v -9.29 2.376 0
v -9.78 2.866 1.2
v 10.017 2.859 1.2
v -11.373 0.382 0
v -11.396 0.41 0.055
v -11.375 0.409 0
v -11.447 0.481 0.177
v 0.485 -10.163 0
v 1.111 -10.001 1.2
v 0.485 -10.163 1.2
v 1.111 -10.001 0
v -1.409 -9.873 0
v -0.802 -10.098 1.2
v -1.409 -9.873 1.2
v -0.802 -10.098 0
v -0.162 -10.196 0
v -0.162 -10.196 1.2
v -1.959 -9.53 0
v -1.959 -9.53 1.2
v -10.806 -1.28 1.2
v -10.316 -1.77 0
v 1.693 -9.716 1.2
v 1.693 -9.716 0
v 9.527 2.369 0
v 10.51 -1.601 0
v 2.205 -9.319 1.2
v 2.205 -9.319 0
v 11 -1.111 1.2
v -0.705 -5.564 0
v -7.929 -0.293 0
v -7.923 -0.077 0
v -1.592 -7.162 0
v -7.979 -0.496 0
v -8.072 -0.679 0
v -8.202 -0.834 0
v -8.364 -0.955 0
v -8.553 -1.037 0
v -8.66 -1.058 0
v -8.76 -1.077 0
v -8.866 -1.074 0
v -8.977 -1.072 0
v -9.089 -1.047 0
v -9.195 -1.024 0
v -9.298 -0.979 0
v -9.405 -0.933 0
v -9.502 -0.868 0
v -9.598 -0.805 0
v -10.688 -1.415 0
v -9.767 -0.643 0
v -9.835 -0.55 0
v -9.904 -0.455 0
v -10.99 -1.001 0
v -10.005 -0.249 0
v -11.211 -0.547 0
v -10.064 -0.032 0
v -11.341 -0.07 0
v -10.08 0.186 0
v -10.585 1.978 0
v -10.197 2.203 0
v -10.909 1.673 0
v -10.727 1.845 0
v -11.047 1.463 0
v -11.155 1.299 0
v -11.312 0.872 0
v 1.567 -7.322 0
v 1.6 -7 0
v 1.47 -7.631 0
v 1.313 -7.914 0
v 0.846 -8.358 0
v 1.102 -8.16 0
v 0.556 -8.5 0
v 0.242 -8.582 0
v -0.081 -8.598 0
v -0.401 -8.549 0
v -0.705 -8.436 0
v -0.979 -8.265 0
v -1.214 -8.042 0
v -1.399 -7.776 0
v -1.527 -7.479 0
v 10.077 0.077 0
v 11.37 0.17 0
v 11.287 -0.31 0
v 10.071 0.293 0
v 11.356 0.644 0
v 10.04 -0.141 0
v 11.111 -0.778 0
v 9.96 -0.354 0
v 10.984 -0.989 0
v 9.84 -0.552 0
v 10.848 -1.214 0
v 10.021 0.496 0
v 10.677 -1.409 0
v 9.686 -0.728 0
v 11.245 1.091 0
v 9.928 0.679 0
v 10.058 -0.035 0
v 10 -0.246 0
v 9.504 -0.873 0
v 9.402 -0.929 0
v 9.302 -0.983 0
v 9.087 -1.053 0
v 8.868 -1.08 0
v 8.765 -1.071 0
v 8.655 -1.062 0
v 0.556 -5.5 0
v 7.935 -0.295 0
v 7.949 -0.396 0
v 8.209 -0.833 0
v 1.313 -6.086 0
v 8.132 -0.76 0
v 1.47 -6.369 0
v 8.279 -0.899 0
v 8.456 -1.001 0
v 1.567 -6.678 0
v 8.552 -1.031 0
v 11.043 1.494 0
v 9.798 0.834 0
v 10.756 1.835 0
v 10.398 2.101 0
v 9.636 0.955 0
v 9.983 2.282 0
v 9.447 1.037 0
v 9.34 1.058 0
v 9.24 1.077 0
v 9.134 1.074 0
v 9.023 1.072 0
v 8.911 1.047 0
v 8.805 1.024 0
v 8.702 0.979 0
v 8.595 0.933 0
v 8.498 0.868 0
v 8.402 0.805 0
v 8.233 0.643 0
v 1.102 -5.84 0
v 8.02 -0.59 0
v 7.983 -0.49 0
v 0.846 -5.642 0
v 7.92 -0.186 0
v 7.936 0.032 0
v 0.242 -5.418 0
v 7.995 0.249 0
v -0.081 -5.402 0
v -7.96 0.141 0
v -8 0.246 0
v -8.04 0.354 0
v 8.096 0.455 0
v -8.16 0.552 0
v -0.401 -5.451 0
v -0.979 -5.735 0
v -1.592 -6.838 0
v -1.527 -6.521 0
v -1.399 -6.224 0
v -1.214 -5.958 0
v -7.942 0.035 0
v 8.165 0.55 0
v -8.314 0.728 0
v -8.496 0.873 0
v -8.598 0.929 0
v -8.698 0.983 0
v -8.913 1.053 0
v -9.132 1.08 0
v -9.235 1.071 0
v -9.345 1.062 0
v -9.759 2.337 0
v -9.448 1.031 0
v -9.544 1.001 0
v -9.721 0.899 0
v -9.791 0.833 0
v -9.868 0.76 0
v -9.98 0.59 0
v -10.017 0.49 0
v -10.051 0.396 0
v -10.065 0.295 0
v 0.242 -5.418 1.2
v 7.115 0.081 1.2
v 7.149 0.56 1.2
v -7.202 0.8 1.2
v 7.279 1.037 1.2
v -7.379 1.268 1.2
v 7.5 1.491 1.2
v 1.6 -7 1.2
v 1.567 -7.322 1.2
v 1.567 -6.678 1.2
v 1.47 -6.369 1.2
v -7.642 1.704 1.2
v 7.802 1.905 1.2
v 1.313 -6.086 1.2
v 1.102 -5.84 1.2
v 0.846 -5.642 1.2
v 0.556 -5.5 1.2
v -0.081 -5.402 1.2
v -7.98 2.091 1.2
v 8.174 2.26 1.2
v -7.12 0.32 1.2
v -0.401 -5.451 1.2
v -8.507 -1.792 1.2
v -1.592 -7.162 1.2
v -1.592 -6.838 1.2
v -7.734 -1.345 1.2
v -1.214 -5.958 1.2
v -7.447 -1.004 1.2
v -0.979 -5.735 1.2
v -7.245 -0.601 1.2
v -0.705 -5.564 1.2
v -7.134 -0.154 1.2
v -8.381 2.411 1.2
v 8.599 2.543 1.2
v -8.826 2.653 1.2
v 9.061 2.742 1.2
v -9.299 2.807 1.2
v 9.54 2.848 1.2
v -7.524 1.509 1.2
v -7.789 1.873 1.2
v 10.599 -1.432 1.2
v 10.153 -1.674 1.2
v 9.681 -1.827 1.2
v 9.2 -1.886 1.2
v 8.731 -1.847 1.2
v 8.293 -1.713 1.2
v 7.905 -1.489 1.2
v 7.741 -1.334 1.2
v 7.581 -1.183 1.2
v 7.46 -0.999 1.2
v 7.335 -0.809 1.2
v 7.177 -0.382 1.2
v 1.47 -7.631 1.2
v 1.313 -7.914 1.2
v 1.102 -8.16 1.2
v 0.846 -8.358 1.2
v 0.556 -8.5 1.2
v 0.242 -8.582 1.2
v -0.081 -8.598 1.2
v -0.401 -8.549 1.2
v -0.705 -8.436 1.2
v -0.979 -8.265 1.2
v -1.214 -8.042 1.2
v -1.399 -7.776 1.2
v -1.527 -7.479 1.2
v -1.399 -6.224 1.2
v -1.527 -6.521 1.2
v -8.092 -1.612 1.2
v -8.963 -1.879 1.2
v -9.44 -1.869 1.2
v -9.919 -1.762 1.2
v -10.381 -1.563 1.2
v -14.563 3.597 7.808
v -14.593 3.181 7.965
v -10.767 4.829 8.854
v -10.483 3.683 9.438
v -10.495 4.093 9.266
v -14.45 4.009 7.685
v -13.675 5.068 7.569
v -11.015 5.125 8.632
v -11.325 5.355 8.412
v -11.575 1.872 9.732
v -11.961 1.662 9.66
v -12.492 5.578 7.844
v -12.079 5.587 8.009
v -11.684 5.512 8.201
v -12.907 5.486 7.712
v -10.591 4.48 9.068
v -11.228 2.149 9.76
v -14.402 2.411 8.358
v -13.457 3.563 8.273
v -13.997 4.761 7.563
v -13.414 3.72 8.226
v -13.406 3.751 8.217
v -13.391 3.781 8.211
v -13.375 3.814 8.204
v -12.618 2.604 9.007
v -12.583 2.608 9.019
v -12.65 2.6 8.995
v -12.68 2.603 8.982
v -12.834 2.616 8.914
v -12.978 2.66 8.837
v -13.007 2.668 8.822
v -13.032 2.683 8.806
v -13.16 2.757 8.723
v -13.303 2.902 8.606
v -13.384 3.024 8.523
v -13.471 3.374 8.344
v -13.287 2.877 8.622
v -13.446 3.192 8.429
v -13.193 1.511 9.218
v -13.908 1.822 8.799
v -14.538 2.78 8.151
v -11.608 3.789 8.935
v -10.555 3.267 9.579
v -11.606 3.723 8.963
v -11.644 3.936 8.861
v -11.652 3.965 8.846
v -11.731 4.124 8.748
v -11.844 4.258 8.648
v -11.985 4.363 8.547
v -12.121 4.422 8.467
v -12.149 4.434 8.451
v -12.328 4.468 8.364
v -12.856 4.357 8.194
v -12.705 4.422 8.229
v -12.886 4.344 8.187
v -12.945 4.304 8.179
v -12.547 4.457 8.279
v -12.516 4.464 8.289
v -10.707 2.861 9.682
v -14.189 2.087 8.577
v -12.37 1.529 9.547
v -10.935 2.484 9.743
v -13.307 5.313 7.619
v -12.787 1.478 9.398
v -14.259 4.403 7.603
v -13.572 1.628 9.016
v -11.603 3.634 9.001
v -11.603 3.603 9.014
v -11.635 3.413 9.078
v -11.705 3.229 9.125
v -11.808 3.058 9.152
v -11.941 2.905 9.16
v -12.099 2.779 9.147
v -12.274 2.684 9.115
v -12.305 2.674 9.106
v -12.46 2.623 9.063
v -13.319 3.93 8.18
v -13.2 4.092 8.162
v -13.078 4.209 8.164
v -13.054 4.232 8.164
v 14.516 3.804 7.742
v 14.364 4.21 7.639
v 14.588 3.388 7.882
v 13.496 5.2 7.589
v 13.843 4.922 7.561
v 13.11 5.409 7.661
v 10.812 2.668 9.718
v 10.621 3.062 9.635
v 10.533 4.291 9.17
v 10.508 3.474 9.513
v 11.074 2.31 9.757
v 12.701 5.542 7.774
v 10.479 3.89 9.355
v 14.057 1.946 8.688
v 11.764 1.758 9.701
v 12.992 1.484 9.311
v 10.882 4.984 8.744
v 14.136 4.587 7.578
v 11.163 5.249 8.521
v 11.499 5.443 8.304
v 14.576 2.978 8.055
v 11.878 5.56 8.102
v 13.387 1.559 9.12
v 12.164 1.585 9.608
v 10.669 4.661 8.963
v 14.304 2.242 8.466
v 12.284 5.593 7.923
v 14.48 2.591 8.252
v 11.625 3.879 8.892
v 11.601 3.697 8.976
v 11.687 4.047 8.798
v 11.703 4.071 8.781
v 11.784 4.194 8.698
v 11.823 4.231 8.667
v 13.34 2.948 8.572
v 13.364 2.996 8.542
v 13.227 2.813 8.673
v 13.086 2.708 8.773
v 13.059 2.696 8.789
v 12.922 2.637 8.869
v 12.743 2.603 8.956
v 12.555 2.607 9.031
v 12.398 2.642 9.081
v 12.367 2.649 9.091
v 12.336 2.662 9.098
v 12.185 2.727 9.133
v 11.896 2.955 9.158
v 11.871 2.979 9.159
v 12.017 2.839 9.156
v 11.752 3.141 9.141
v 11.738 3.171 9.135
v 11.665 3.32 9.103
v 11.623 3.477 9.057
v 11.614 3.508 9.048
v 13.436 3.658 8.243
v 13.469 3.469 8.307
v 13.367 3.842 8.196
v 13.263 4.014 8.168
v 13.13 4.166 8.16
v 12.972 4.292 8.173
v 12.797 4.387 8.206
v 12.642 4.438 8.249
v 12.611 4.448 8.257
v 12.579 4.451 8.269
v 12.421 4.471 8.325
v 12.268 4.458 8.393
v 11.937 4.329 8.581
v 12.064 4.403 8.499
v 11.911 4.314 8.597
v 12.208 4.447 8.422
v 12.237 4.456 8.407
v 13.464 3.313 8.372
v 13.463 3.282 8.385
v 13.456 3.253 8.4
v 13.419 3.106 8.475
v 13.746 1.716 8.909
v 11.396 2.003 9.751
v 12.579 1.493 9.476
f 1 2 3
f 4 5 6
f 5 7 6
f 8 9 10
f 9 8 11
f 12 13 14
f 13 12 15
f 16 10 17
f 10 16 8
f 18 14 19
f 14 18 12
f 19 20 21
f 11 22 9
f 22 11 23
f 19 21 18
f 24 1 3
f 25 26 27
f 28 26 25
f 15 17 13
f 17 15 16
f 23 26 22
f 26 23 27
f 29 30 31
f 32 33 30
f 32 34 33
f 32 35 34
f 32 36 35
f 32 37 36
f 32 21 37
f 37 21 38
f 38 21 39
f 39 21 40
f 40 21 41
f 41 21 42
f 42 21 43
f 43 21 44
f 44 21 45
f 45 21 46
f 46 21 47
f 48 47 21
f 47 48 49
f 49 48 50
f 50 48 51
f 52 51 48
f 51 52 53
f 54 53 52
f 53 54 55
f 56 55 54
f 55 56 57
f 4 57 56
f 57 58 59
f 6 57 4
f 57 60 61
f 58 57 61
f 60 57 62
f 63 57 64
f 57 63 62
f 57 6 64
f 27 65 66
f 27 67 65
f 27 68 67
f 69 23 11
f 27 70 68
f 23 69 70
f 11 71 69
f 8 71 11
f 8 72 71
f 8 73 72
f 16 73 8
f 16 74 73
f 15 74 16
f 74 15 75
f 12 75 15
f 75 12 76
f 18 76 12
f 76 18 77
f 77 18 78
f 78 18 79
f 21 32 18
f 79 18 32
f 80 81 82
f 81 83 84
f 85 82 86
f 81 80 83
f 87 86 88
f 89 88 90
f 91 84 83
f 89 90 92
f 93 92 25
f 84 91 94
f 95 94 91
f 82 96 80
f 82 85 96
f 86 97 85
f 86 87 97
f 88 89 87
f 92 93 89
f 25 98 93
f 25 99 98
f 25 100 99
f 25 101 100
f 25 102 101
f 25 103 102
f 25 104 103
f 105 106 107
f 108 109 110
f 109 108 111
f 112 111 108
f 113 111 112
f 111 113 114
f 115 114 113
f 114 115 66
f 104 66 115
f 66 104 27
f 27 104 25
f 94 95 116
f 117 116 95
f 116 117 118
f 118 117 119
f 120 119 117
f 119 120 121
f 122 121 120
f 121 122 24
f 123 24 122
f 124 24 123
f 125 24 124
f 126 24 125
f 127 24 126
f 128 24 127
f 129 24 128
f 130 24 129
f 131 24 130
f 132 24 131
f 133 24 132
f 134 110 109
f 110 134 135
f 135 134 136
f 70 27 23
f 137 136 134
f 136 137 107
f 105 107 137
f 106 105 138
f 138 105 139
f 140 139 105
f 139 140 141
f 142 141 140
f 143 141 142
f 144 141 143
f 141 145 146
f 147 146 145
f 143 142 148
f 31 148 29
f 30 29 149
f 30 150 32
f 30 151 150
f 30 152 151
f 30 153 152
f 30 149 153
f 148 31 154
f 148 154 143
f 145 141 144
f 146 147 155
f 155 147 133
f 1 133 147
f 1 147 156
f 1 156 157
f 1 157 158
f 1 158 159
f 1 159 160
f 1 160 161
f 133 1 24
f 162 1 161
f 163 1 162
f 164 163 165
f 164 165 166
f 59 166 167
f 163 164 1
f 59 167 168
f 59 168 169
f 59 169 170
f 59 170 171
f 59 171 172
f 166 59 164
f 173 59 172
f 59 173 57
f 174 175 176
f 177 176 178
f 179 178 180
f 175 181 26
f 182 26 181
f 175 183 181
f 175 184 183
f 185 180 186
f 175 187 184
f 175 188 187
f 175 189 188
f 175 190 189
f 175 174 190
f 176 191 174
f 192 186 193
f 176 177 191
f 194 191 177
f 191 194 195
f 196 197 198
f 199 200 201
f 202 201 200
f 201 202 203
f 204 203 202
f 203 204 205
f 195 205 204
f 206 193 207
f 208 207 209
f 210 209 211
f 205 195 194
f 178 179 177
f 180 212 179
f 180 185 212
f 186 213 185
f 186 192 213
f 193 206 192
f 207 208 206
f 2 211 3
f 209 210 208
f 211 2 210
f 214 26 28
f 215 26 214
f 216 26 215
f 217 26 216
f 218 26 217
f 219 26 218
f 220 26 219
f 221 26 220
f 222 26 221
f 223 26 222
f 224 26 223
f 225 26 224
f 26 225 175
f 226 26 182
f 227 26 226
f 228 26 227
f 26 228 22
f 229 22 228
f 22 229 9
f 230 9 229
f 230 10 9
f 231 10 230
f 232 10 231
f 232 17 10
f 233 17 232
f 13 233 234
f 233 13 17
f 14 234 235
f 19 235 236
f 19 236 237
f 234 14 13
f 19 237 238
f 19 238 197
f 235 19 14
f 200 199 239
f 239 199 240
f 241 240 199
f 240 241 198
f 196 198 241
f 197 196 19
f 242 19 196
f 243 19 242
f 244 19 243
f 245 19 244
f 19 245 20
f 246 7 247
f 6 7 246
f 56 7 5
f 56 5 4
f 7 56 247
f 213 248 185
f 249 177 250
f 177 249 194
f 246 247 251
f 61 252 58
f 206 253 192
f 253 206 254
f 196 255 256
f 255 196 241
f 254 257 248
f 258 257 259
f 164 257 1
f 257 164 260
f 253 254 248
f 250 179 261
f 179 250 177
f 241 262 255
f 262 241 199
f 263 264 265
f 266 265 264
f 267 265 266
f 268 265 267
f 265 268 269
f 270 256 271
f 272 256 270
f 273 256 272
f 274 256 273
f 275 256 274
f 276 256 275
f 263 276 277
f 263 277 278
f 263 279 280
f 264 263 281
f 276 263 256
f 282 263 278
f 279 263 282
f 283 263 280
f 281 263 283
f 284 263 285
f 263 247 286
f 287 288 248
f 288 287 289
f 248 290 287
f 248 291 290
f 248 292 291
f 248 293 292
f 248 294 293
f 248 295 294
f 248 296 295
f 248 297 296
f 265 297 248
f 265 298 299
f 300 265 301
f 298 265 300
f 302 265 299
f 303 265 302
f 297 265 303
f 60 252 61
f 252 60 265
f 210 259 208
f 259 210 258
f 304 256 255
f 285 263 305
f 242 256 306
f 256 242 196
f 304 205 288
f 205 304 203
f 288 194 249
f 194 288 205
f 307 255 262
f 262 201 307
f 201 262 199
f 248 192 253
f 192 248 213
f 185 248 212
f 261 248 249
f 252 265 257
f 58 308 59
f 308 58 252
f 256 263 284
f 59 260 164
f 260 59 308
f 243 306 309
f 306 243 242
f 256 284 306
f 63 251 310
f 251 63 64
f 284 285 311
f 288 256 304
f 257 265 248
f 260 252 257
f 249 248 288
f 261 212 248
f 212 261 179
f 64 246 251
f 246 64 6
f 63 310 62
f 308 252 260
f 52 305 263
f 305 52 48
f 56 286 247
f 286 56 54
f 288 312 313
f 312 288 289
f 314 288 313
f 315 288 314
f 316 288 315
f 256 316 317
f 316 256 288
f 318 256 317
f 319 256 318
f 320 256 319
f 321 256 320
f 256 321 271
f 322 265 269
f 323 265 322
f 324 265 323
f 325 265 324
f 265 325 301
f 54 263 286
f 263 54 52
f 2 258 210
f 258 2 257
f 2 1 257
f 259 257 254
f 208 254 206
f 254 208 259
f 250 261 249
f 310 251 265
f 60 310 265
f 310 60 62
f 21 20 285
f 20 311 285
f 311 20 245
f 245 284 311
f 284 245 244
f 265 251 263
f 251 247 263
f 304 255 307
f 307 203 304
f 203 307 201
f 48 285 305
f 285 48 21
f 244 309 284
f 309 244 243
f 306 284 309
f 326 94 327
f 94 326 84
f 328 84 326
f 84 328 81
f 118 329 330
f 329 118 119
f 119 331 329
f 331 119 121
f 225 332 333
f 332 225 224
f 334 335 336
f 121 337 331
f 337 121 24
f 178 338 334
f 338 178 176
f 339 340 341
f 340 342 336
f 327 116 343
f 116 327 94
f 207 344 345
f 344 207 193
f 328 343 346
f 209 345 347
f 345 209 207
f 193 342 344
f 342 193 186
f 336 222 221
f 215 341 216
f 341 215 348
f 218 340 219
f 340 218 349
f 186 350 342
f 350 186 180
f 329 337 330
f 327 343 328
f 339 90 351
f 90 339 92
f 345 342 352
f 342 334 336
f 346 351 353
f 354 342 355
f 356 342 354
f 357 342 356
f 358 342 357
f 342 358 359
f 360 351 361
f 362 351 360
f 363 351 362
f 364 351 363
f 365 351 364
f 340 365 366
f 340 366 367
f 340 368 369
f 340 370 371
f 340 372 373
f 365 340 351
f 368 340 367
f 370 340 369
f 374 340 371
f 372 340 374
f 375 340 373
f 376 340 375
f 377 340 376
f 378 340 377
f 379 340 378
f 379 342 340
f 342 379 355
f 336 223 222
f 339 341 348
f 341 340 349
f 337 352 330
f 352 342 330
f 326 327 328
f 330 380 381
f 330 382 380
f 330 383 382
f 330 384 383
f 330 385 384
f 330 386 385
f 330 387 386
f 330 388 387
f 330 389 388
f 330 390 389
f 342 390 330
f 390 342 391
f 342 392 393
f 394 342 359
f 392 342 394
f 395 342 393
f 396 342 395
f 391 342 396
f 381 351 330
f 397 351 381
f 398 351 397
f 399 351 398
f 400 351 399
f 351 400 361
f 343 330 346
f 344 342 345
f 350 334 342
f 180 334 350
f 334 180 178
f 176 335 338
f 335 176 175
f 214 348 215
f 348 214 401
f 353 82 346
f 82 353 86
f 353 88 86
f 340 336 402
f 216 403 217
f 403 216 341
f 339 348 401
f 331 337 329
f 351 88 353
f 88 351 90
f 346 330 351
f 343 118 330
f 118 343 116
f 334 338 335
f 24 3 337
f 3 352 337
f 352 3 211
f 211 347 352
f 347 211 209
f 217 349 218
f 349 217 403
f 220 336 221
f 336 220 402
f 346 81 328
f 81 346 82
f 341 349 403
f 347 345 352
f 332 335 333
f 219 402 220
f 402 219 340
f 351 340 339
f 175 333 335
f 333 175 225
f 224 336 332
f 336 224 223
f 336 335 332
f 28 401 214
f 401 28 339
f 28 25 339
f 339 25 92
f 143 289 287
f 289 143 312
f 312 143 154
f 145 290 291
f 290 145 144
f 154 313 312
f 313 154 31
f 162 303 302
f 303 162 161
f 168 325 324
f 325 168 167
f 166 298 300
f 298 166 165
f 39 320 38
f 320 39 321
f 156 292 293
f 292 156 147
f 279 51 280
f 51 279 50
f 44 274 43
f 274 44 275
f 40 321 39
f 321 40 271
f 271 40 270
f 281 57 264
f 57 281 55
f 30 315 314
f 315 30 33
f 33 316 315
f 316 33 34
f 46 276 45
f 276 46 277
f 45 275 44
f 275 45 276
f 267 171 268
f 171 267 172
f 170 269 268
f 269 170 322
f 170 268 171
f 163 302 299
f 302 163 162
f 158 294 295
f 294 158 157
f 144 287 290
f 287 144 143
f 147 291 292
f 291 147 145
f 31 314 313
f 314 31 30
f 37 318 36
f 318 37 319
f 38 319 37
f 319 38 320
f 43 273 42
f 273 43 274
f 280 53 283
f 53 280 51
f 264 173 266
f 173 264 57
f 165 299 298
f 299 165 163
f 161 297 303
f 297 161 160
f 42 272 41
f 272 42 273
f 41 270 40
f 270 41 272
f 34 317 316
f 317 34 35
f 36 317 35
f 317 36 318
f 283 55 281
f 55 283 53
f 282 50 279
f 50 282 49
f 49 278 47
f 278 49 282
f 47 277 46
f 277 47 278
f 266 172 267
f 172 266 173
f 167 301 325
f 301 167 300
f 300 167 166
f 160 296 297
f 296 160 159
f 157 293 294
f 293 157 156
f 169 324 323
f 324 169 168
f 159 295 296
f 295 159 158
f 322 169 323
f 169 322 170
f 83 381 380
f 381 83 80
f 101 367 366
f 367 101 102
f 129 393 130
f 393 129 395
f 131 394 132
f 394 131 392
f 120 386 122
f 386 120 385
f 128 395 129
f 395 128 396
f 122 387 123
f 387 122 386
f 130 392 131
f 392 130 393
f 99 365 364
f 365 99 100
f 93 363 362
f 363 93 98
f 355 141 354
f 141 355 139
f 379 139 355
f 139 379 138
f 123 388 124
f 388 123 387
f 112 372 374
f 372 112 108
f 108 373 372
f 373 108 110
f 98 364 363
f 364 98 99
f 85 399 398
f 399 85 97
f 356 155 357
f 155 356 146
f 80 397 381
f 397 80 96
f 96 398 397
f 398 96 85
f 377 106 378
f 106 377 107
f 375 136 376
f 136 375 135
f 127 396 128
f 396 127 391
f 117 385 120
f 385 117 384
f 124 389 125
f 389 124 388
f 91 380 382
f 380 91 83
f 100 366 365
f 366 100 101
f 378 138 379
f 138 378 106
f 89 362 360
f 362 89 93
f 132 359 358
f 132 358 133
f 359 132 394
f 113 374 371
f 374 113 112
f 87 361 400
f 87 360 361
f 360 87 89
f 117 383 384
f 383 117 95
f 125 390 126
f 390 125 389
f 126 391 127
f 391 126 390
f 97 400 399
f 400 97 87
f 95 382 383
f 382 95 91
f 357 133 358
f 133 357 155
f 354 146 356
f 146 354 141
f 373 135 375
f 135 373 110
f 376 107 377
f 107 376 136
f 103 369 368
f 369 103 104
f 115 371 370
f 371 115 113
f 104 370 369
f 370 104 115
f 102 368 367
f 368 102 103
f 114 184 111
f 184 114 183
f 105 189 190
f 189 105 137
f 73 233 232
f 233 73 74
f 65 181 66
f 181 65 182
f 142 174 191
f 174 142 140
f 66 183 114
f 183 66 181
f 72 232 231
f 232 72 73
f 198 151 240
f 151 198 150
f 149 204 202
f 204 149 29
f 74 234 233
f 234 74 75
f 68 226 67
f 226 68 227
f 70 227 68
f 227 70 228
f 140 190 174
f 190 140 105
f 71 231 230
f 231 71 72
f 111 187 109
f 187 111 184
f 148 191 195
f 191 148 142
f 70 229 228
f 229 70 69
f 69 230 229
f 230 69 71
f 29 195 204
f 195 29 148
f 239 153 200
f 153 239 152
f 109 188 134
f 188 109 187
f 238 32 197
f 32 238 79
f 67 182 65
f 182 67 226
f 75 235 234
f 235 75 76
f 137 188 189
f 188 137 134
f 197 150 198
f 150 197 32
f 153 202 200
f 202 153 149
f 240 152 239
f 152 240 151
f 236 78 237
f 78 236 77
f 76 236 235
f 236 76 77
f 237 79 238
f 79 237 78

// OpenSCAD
d1=2;
th_d=1.2;
$fn=31;

module tube_i(offset, axes){
    translate([offset, 0, 0])
    rotate(-30, axes)
    cylinder(d=d1, h=30, center=true);}


module tube_o(offset, axes){
    translate([offset, 0, 0])
    rotate(-30, axes)
    cylinder(d=d1+th_d*2, h=20, center=true);
}


difference(){
    intersection(){
        union(){
        hull(){
            intersection(){
                union()
                {
                tube_o(-9, [1, 1, 0]);
                tube_o(9,[1, -1, 0]);
                }
                translate([0, 0, 0.6])cube([50, 50, 1.2], center=true);
                
            }
            translate([0, -7, 0])cylinder(d=6.4, h=1.2);
        }
        tube_o(-9, [1, 1, 0]);
        tube_o(9,[1, -1, 0]);
        }
        translate([0, 0, 25])cube([50, 50, 50], center=true);
    }
    tube_i(-9, [1, 1, 0]);
    tube_i(9,[1, -1, 0]);
    translate([0, -7, 0])cylinder(d=3.2, h=5, center=true);

}
